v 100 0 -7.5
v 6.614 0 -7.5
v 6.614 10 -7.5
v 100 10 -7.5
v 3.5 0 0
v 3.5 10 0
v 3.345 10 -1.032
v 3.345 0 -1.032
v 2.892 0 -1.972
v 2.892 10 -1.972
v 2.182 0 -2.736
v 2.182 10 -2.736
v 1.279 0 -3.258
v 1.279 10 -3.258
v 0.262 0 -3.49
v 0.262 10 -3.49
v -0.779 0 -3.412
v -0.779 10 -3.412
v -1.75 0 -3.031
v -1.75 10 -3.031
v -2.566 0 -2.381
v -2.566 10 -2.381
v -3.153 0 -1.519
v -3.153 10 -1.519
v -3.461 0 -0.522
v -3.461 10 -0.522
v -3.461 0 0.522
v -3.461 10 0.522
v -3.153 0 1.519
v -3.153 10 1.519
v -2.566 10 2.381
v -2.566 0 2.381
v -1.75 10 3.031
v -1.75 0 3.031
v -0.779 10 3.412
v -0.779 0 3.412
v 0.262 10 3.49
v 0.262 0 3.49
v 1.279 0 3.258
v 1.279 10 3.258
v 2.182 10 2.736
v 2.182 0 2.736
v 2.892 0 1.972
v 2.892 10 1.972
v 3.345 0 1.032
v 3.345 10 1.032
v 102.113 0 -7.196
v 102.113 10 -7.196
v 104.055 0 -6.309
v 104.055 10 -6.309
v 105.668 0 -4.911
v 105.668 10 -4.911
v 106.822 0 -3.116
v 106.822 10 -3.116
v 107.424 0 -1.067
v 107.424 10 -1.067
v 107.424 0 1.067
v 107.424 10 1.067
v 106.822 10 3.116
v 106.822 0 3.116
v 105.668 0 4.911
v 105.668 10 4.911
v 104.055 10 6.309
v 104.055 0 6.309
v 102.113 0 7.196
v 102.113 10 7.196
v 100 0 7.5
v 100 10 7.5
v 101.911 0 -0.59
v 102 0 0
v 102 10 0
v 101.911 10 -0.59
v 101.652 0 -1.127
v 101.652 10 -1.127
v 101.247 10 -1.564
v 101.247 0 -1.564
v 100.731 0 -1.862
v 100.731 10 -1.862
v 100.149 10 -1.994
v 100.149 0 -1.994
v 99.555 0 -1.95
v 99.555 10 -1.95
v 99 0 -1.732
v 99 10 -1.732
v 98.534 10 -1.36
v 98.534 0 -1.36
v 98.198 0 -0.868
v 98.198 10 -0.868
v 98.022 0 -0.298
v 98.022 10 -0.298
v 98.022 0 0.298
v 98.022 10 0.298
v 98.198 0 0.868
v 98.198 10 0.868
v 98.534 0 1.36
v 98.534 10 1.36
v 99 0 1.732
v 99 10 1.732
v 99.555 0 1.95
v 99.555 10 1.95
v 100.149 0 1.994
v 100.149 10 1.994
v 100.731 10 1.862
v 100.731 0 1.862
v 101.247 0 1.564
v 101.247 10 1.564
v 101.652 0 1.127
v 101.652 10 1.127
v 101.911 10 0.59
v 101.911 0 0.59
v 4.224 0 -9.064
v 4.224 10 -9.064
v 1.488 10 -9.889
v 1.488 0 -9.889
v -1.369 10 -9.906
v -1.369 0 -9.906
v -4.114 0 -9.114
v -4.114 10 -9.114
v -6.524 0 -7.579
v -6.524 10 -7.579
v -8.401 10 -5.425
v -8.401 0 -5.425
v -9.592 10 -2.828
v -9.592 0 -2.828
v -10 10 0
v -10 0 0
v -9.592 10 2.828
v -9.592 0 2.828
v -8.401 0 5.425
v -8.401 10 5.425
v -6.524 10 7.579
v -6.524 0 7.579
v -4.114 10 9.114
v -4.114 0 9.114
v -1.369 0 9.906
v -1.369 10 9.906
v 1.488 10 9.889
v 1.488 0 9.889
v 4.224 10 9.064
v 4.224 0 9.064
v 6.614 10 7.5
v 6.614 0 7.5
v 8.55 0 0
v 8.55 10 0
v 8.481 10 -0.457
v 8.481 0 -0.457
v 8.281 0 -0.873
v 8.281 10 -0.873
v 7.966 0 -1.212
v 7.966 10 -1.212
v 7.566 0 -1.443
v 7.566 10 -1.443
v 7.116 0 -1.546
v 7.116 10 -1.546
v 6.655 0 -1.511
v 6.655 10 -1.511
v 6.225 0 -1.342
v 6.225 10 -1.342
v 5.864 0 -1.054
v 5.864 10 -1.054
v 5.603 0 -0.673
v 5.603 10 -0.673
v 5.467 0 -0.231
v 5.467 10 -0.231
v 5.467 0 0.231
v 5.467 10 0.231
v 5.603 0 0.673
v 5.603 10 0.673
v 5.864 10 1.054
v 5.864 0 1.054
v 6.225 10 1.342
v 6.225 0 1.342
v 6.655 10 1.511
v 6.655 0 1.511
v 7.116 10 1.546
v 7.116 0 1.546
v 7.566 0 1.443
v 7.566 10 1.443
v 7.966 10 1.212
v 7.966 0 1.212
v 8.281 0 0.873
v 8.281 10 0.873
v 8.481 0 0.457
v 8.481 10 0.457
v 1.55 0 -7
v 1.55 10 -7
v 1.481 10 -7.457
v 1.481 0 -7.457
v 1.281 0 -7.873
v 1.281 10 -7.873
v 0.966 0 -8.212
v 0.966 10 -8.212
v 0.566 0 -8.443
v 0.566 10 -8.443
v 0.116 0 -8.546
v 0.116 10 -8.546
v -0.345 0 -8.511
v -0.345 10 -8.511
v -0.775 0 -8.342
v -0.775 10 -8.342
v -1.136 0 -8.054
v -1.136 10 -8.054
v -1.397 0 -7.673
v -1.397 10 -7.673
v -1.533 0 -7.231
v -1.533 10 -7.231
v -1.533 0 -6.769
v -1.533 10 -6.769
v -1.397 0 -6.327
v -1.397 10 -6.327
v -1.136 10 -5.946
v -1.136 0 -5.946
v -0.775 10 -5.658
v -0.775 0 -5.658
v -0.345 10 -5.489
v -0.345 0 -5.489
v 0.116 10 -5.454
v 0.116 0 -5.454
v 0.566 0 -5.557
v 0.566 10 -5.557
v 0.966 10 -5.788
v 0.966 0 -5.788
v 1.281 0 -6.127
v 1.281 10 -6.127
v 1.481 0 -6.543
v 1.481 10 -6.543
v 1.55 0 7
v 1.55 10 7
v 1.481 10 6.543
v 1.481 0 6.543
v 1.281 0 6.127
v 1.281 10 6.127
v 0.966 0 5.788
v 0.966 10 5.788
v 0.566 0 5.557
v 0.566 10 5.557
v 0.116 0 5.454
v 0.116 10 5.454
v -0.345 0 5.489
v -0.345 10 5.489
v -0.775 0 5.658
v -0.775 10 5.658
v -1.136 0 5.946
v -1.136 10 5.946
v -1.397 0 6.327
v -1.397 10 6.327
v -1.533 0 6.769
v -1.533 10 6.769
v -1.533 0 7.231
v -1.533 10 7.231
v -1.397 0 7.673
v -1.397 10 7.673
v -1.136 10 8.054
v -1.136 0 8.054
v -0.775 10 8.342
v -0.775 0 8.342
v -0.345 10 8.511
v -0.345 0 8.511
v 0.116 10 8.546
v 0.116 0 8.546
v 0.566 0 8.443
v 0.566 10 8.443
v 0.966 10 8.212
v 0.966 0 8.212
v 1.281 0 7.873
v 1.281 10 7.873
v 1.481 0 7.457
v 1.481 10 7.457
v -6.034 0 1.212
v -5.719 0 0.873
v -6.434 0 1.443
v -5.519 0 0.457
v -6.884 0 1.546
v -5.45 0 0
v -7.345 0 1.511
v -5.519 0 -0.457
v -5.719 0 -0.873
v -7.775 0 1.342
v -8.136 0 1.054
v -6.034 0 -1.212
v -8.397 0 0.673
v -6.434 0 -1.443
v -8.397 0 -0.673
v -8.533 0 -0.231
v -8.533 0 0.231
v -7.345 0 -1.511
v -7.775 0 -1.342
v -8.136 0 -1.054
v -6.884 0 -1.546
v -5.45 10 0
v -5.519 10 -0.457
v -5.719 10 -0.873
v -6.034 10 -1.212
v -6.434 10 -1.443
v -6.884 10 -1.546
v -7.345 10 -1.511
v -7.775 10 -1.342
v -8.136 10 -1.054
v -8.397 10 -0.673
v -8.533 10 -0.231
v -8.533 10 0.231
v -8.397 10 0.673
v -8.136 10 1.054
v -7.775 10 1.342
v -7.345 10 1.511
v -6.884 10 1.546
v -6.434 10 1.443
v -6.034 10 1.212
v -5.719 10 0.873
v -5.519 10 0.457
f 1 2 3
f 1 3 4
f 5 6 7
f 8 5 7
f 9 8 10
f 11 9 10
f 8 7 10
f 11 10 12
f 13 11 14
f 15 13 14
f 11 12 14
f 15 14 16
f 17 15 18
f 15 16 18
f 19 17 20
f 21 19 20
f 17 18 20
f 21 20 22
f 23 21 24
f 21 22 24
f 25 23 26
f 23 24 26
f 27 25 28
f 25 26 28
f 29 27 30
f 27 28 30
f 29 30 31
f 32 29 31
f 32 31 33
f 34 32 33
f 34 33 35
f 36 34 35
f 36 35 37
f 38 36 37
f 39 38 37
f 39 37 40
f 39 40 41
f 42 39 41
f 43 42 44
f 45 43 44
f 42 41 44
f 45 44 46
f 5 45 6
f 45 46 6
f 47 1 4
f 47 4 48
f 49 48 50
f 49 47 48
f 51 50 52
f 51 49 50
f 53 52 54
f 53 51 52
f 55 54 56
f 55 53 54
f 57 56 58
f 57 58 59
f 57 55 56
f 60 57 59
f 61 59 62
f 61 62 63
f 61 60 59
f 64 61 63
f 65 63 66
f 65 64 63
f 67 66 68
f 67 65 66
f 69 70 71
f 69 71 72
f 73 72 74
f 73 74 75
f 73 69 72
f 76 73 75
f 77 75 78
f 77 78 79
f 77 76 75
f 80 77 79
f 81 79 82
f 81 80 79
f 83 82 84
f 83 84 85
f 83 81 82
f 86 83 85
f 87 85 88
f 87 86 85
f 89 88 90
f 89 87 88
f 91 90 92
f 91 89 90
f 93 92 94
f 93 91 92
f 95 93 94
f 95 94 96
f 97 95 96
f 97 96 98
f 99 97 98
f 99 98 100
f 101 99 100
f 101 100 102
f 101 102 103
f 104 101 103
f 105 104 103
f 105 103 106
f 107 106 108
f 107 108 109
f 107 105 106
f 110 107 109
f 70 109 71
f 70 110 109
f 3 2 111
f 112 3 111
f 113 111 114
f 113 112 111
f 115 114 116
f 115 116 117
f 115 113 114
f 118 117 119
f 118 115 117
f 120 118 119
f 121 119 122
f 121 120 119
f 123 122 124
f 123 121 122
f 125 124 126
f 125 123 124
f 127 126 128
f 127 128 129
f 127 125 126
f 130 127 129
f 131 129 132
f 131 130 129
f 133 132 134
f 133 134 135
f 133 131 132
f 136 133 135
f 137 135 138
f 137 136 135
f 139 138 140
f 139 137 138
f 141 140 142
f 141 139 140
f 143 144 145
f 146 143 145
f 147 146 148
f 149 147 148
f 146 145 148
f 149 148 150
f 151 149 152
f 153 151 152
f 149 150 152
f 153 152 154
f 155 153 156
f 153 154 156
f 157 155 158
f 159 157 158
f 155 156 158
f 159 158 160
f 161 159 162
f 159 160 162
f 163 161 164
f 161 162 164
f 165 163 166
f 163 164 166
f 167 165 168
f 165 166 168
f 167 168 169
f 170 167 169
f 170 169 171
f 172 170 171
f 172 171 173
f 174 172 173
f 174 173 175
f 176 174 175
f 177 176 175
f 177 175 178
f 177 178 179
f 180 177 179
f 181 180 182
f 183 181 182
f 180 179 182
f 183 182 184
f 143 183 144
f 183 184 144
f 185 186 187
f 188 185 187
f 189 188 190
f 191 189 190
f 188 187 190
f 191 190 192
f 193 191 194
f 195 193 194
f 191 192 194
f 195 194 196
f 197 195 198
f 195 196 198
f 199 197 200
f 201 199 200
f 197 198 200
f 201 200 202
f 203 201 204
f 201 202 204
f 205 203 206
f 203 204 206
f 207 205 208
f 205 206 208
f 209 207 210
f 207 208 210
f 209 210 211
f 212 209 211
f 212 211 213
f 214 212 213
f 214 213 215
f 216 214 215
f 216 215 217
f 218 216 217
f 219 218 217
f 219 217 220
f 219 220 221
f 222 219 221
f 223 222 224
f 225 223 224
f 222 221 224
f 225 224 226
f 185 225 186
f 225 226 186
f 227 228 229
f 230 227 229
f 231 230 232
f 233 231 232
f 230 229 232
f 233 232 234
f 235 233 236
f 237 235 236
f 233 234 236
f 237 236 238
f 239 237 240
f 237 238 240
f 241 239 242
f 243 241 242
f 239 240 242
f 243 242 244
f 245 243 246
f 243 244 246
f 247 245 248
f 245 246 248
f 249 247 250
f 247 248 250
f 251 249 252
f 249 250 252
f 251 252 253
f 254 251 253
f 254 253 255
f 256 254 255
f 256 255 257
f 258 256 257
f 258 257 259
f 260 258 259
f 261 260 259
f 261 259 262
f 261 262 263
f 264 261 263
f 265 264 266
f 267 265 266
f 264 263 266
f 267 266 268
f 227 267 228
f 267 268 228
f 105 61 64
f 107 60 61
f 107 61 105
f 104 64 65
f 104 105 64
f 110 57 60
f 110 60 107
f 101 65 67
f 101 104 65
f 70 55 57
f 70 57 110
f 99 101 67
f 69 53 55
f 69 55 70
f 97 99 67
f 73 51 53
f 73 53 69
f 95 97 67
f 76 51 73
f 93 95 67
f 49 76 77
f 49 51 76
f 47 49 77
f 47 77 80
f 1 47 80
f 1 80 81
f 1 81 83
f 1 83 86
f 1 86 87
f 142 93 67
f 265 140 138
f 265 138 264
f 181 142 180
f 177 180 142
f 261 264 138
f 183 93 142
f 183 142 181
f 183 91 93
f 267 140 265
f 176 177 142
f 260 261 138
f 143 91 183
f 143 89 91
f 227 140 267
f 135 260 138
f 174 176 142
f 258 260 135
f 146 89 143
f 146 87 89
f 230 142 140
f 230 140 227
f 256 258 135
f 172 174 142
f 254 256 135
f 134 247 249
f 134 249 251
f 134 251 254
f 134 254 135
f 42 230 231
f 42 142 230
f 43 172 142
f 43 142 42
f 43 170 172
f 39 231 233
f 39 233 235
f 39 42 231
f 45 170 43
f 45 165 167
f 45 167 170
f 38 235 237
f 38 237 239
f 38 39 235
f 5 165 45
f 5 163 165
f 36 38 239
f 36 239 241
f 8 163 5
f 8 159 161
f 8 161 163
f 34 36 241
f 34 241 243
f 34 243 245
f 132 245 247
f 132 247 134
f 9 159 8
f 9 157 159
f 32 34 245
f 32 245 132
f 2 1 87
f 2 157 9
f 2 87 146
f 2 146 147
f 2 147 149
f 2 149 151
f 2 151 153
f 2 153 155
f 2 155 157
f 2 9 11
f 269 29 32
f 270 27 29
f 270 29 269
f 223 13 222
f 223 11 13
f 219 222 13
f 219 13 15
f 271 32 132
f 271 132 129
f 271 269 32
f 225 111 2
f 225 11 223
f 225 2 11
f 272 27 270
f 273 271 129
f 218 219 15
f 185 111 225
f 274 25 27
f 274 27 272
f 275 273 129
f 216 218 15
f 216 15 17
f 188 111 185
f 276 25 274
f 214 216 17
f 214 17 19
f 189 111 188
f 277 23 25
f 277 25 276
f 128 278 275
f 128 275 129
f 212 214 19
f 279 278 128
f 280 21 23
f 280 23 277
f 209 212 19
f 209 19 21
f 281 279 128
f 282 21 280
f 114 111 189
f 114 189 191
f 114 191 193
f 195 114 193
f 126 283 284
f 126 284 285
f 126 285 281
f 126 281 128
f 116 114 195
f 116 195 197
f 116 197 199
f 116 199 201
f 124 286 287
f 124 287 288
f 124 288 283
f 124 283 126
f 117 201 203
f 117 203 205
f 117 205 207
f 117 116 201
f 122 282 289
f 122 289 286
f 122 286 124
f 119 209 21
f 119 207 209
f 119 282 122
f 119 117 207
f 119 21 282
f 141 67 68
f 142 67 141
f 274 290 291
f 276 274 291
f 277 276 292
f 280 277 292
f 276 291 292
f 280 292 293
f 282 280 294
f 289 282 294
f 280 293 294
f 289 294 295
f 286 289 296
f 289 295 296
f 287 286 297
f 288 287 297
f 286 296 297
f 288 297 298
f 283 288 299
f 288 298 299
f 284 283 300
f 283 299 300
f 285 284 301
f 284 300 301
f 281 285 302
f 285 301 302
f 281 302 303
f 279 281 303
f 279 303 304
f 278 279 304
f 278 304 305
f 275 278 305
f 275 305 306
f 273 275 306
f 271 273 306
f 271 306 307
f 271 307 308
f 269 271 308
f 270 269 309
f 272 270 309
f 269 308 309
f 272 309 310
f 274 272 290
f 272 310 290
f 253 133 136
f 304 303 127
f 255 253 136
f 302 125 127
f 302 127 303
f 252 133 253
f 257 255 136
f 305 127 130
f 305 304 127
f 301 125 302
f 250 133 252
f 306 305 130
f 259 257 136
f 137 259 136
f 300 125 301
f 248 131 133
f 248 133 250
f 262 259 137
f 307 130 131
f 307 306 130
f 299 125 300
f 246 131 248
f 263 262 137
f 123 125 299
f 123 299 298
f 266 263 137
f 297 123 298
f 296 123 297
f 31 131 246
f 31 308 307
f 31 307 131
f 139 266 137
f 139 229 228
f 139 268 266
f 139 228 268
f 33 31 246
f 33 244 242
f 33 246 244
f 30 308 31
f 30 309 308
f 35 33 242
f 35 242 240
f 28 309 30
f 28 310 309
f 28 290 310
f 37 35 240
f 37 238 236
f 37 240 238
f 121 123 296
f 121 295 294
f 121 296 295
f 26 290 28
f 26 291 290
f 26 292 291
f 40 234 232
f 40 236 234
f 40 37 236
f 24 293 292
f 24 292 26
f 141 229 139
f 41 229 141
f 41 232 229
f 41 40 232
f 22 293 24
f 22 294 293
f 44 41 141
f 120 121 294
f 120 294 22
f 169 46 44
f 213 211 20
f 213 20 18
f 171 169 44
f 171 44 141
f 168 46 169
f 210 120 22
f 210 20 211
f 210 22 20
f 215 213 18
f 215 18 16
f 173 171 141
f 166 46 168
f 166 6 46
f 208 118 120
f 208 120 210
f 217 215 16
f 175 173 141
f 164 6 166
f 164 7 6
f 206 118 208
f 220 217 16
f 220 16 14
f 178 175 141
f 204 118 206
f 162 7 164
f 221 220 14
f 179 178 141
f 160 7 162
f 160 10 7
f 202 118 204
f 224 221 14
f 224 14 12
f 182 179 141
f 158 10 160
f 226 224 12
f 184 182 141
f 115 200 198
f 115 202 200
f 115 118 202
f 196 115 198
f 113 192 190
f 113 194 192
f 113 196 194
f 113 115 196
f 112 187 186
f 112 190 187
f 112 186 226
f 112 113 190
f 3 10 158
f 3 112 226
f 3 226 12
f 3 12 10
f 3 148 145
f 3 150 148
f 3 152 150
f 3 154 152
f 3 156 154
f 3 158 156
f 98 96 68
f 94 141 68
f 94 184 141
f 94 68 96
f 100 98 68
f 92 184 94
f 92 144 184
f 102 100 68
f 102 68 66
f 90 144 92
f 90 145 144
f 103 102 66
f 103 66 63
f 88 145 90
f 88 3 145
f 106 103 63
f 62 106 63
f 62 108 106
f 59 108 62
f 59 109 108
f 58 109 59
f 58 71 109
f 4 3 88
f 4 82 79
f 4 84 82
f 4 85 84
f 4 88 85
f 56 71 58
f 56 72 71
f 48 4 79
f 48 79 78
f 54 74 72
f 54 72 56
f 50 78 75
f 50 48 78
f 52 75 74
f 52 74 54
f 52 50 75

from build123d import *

# Parameters (mm, degrees)
SKETCH2_R           = 2.5
SKETCH2_R_2         = 2
BOSS_EXTRUDE1_DEPTH = 10
SKETCH4_R           = 1.5
CUT_EXTRUDE3_DEPTH  = 16
SKETCH7_R           = 10
BOSS_EXTRUDE4_DEPTH = 10
SKETCH8_R           = 1.55
SKETCH8_R_2         = 3.5
CUT_EXTRUDE7_DEPTH  = 10


with BuildPart() as part:
    # Sketch2 → Boss-Extrude1 (new body)
    with BuildSketch(Plane(origin=(0, 0, 0), x_dir=(1, 0, 0), z_dir=(0, 1, 0))):
        with BuildLine():
            Line((0, 7.5), (100, 7.5))
            ThreePointArc((100, 7.5), (107.5, 0), (100, -7.5))
            Line((100, -7.5), (0, -7.5))
            ThreePointArc((0, -7.5), (-7.5, 0), (0, 7.5))
        make_face()
        Circle(SKETCH2_R, mode=Mode.SUBTRACT)
        with Locations((100, 0)):
            Circle(SKETCH2_R_2, mode=Mode.SUBTRACT)
    extrude(amount=BOSS_EXTRUDE1_DEPTH)

    # Sketch4 → Cut-Extrude3 (cut, through all)
    with BuildSketch(Plane(origin=(0, 0, -7.5), x_dir=(-1, 0, 0), z_dir=(0, 0, -1))):
        with Locations((0, 5)):
            Circle(SKETCH4_R)
    extrude(amount=-CUT_EXTRUDE3_DEPTH, mode=Mode.SUBTRACT)

    # Sketch7 → Boss-Extrude4 (add)
    with BuildSketch(Plane(origin=(0, 10, 0), x_dir=(1, 0, 0), z_dir=(0, 1, 0))):
        Circle(SKETCH7_R)
    extrude(amount=-BOSS_EXTRUDE4_DEPTH)

    # Sketch8 → Cut-Extrude7 (cut)
    with BuildSketch(Plane(origin=(0, 10, 0), x_dir=(1, 0, 0), z_dir=(0, 1, 0))):
        with Locations((0, 7)):
            Circle(SKETCH8_R)
        with Locations((7, 0)):
            Circle(SKETCH8_R)
        with Locations((0, -7)):
            Circle(SKETCH8_R)
        with Locations((-7, 0)):
            Circle(SKETCH8_R)
        Circle(SKETCH8_R_2)
    extrude(amount=-CUT_EXTRUDE7_DEPTH, mode=Mode.SUBTRACT)


solid = part.part
